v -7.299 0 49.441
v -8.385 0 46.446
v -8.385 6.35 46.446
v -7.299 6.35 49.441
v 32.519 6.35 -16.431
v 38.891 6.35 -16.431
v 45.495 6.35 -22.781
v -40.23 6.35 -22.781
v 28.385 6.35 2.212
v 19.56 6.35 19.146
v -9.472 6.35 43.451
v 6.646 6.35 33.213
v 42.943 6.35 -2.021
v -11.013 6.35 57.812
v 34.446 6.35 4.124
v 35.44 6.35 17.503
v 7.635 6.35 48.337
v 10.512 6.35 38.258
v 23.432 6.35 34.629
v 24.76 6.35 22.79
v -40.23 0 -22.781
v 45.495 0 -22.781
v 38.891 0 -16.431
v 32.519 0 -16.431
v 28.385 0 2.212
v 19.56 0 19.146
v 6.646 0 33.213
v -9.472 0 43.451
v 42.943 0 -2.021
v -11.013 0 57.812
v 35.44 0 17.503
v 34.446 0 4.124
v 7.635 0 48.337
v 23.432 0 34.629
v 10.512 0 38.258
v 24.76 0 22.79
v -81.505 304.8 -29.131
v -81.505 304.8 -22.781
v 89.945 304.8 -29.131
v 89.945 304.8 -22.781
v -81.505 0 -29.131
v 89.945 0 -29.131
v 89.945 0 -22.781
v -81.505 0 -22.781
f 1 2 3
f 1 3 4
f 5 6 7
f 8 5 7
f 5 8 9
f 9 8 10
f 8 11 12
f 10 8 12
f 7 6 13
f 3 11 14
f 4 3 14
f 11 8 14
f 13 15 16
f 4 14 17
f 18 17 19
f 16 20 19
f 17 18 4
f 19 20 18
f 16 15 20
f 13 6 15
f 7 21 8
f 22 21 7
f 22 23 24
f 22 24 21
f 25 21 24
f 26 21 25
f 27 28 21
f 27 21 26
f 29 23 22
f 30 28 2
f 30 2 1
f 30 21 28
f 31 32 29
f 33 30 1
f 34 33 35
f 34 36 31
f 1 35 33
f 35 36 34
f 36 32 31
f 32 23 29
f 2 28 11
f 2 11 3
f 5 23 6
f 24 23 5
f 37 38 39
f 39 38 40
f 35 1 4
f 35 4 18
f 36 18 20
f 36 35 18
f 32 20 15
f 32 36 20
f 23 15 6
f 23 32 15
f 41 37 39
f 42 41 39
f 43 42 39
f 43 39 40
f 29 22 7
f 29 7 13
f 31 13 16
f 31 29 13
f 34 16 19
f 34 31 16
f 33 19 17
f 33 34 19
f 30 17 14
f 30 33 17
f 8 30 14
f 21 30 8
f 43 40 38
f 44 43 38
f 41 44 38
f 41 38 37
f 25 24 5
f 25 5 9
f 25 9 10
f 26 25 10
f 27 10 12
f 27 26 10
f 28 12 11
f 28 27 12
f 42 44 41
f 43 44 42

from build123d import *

# Parameters (mm, degrees)
F2_DEPTH = 6.35
F3_DEPTH = 304.8


# Not quite as in the source:
# - a feature names something its author has since deleted; it is built from what else it names


with BuildPart() as f2:
    # F0 (on Front) → F2 (new body)
    with BuildSketch(Plane.XZ):
        with BuildLine():
            Line((39.1451127164, -22.7806820739), (45.4951127164, -22.7806820739))
            ThreePointArc((45.4951127164, -22.7806820739), (29.9606120641, 26.4338424724), (-11.012777078, 57.8117251134))
            Line((-11.012777078, 57.8117251134), (-13.1770074636, 51.8419171736))
            ThreePointArc((-13.1770074636, 51.8419171736), (-10.2137544615, 50.700080003), (-7.2985464975, 49.4406265478))
            ThreePointArc((-7.2985464975, 49.4406265478), (24.7598523038, 22.7904093477), (38.8907050107, -16.4306820739))
            ThreePointArc((38.8907050107, -16.4306820739), (39.0814852879, -19.603134935), (39.1451127164, -22.7806820739))
        make_face()
        with BuildLine():
            Line((-13.1770074636, 51.8419171736), (-15.3412378492, 45.8721092338))
            ThreePointArc((-15.3412378492, 45.8721092338), (-12.380476471, 44.7253246395), (-9.472363604, 43.4509218784))
            Line((-9.472363604, 43.4509218784), (-8.3852980682, 46.4462067606))
            Line((-8.3852980682, 46.4462067606), (-7.2985464975, 49.4406265478))
            ThreePointArc((-7.2985464975, 49.4406265478), (-10.2137544615, 50.700080003), (-13.1770074636, 51.8419171736))
        make_face()
        with BuildLine():
            Line((-15.3412378492, 45.8721092338), (-40.2298872836, -22.7806820739))
            Line((-40.2298872836, -22.7806820739), (-11.6548872836, -22.7806820739))
            Line((-11.6548872836, -22.7806820739), (32.7951127164, -22.7806820739))
            ThreePointArc((32.7951127164, -22.7806820739), (32.7259272318, -19.6026711567), (32.5185018738, -16.4306820739))
            ThreePointArc((32.5185018738, -16.4306820739), (19.5599121895, 19.1458072135), (-9.472363604, 43.4509218784))
            ThreePointArc((-9.472363604, 43.4509218784), (-12.380476471, 44.7253246395), (-15.3412378492, 45.8721092338))
        make_face()
        with BuildLine():
            Line((35.9701127164, -22.7806820739), (39.1451127164, -22.7806820739))
            ThreePointArc((39.1451127164, -22.7806820739), (39.0814852879, -19.603134935), (38.8907050107, -16.4306820739))
            Line((38.8907050107, -16.4306820739), (35.7050684351, -16.4306820739))
            Line((35.7050684351, -16.4306820739), (35.7046034422, -16.4306820739))
            Line((35.7046034422, -16.4306820739), (32.5185018738, -16.4306820739))
            ThreePointArc((32.5185018738, -16.4306820739), (32.7259272318, -19.6026711567), (32.7951127164, -22.7806820739))
            Line((32.7951127164, -22.7806820739), (35.9701127164, -22.7806820739))
        make_face()
    extrude(amount=-F2_DEPTH)


with BuildPart() as f3:
    # F0 (on Front) → F3 (new body)
    with BuildSketch(Plane.XZ):
        Polygon((-81.5048872836, -22.7806820739), (-81.5048872836, -29.1306820739), (89.9451127164, -29.1306820739), (89.9451127164, -22.7806820739), (45.4951127164, -22.7806820739), (39.1451127164, -22.7806820739), (35.9701127164, -22.7806820739), (32.7951127164, -22.7806820739), (-11.6548872836, -22.7806820739), (-40.2298872836, -22.7806820739), align=None)
    extrude(amount=-F3_DEPTH)


solid = Compound([f2.part, f3.part])
